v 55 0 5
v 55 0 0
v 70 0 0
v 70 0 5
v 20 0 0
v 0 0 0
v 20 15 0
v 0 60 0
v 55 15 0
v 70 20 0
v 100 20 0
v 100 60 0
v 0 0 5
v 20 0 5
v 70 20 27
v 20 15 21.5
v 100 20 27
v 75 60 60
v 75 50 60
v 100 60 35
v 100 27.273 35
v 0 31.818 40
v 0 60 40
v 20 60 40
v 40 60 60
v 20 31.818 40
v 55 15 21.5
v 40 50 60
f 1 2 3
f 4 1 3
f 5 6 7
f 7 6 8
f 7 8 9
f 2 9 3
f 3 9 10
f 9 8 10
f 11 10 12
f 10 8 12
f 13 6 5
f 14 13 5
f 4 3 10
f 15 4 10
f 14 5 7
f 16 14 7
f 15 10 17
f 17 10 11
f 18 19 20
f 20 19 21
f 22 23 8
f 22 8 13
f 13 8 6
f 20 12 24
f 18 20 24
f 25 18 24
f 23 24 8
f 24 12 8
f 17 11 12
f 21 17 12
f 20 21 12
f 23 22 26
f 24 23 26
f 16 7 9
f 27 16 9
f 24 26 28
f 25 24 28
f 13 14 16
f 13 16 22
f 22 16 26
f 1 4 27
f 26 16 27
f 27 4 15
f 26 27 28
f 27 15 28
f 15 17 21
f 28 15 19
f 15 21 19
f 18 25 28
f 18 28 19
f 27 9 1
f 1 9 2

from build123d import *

# Parameters (mm, degrees)
F1_DEPTH = 60
F3_DEPTH = 60.001
F5_DEPTH = 100.001


with BuildPart() as f1:
    # F0 (on Top) → F1 (new body)
    with BuildSketch(Plane.XY):
        Polygon((0, 60), (0, 0), (20, 0), (20, 15), (55, 15), (55, 0), (70, 0), (70, 20), (100, 20), (100, 60), align=None)
    extrude(amount=F1_DEPTH)

    # F2 (on Front) → F3 (cut, through all)
    with BuildSketch(Plane.XZ):
        Polygon((0, 60), (0, 40), (20, 40), (40, 60), align=None)
        Polygon((100, 60), (75, 60), (100, 35), align=None)
    extrude(amount=-F3_DEPTH, mode=Mode.SUBTRACT)

    # F4 (on face) → F5 (cut, through all)
    with BuildSketch(Plane.YZ.offset(100)):
        Polygon((0, 5), (50, 60), (0, 60), align=None)
    extrude(amount=-F5_DEPTH, mode=Mode.SUBTRACT)


solid = f1.part
